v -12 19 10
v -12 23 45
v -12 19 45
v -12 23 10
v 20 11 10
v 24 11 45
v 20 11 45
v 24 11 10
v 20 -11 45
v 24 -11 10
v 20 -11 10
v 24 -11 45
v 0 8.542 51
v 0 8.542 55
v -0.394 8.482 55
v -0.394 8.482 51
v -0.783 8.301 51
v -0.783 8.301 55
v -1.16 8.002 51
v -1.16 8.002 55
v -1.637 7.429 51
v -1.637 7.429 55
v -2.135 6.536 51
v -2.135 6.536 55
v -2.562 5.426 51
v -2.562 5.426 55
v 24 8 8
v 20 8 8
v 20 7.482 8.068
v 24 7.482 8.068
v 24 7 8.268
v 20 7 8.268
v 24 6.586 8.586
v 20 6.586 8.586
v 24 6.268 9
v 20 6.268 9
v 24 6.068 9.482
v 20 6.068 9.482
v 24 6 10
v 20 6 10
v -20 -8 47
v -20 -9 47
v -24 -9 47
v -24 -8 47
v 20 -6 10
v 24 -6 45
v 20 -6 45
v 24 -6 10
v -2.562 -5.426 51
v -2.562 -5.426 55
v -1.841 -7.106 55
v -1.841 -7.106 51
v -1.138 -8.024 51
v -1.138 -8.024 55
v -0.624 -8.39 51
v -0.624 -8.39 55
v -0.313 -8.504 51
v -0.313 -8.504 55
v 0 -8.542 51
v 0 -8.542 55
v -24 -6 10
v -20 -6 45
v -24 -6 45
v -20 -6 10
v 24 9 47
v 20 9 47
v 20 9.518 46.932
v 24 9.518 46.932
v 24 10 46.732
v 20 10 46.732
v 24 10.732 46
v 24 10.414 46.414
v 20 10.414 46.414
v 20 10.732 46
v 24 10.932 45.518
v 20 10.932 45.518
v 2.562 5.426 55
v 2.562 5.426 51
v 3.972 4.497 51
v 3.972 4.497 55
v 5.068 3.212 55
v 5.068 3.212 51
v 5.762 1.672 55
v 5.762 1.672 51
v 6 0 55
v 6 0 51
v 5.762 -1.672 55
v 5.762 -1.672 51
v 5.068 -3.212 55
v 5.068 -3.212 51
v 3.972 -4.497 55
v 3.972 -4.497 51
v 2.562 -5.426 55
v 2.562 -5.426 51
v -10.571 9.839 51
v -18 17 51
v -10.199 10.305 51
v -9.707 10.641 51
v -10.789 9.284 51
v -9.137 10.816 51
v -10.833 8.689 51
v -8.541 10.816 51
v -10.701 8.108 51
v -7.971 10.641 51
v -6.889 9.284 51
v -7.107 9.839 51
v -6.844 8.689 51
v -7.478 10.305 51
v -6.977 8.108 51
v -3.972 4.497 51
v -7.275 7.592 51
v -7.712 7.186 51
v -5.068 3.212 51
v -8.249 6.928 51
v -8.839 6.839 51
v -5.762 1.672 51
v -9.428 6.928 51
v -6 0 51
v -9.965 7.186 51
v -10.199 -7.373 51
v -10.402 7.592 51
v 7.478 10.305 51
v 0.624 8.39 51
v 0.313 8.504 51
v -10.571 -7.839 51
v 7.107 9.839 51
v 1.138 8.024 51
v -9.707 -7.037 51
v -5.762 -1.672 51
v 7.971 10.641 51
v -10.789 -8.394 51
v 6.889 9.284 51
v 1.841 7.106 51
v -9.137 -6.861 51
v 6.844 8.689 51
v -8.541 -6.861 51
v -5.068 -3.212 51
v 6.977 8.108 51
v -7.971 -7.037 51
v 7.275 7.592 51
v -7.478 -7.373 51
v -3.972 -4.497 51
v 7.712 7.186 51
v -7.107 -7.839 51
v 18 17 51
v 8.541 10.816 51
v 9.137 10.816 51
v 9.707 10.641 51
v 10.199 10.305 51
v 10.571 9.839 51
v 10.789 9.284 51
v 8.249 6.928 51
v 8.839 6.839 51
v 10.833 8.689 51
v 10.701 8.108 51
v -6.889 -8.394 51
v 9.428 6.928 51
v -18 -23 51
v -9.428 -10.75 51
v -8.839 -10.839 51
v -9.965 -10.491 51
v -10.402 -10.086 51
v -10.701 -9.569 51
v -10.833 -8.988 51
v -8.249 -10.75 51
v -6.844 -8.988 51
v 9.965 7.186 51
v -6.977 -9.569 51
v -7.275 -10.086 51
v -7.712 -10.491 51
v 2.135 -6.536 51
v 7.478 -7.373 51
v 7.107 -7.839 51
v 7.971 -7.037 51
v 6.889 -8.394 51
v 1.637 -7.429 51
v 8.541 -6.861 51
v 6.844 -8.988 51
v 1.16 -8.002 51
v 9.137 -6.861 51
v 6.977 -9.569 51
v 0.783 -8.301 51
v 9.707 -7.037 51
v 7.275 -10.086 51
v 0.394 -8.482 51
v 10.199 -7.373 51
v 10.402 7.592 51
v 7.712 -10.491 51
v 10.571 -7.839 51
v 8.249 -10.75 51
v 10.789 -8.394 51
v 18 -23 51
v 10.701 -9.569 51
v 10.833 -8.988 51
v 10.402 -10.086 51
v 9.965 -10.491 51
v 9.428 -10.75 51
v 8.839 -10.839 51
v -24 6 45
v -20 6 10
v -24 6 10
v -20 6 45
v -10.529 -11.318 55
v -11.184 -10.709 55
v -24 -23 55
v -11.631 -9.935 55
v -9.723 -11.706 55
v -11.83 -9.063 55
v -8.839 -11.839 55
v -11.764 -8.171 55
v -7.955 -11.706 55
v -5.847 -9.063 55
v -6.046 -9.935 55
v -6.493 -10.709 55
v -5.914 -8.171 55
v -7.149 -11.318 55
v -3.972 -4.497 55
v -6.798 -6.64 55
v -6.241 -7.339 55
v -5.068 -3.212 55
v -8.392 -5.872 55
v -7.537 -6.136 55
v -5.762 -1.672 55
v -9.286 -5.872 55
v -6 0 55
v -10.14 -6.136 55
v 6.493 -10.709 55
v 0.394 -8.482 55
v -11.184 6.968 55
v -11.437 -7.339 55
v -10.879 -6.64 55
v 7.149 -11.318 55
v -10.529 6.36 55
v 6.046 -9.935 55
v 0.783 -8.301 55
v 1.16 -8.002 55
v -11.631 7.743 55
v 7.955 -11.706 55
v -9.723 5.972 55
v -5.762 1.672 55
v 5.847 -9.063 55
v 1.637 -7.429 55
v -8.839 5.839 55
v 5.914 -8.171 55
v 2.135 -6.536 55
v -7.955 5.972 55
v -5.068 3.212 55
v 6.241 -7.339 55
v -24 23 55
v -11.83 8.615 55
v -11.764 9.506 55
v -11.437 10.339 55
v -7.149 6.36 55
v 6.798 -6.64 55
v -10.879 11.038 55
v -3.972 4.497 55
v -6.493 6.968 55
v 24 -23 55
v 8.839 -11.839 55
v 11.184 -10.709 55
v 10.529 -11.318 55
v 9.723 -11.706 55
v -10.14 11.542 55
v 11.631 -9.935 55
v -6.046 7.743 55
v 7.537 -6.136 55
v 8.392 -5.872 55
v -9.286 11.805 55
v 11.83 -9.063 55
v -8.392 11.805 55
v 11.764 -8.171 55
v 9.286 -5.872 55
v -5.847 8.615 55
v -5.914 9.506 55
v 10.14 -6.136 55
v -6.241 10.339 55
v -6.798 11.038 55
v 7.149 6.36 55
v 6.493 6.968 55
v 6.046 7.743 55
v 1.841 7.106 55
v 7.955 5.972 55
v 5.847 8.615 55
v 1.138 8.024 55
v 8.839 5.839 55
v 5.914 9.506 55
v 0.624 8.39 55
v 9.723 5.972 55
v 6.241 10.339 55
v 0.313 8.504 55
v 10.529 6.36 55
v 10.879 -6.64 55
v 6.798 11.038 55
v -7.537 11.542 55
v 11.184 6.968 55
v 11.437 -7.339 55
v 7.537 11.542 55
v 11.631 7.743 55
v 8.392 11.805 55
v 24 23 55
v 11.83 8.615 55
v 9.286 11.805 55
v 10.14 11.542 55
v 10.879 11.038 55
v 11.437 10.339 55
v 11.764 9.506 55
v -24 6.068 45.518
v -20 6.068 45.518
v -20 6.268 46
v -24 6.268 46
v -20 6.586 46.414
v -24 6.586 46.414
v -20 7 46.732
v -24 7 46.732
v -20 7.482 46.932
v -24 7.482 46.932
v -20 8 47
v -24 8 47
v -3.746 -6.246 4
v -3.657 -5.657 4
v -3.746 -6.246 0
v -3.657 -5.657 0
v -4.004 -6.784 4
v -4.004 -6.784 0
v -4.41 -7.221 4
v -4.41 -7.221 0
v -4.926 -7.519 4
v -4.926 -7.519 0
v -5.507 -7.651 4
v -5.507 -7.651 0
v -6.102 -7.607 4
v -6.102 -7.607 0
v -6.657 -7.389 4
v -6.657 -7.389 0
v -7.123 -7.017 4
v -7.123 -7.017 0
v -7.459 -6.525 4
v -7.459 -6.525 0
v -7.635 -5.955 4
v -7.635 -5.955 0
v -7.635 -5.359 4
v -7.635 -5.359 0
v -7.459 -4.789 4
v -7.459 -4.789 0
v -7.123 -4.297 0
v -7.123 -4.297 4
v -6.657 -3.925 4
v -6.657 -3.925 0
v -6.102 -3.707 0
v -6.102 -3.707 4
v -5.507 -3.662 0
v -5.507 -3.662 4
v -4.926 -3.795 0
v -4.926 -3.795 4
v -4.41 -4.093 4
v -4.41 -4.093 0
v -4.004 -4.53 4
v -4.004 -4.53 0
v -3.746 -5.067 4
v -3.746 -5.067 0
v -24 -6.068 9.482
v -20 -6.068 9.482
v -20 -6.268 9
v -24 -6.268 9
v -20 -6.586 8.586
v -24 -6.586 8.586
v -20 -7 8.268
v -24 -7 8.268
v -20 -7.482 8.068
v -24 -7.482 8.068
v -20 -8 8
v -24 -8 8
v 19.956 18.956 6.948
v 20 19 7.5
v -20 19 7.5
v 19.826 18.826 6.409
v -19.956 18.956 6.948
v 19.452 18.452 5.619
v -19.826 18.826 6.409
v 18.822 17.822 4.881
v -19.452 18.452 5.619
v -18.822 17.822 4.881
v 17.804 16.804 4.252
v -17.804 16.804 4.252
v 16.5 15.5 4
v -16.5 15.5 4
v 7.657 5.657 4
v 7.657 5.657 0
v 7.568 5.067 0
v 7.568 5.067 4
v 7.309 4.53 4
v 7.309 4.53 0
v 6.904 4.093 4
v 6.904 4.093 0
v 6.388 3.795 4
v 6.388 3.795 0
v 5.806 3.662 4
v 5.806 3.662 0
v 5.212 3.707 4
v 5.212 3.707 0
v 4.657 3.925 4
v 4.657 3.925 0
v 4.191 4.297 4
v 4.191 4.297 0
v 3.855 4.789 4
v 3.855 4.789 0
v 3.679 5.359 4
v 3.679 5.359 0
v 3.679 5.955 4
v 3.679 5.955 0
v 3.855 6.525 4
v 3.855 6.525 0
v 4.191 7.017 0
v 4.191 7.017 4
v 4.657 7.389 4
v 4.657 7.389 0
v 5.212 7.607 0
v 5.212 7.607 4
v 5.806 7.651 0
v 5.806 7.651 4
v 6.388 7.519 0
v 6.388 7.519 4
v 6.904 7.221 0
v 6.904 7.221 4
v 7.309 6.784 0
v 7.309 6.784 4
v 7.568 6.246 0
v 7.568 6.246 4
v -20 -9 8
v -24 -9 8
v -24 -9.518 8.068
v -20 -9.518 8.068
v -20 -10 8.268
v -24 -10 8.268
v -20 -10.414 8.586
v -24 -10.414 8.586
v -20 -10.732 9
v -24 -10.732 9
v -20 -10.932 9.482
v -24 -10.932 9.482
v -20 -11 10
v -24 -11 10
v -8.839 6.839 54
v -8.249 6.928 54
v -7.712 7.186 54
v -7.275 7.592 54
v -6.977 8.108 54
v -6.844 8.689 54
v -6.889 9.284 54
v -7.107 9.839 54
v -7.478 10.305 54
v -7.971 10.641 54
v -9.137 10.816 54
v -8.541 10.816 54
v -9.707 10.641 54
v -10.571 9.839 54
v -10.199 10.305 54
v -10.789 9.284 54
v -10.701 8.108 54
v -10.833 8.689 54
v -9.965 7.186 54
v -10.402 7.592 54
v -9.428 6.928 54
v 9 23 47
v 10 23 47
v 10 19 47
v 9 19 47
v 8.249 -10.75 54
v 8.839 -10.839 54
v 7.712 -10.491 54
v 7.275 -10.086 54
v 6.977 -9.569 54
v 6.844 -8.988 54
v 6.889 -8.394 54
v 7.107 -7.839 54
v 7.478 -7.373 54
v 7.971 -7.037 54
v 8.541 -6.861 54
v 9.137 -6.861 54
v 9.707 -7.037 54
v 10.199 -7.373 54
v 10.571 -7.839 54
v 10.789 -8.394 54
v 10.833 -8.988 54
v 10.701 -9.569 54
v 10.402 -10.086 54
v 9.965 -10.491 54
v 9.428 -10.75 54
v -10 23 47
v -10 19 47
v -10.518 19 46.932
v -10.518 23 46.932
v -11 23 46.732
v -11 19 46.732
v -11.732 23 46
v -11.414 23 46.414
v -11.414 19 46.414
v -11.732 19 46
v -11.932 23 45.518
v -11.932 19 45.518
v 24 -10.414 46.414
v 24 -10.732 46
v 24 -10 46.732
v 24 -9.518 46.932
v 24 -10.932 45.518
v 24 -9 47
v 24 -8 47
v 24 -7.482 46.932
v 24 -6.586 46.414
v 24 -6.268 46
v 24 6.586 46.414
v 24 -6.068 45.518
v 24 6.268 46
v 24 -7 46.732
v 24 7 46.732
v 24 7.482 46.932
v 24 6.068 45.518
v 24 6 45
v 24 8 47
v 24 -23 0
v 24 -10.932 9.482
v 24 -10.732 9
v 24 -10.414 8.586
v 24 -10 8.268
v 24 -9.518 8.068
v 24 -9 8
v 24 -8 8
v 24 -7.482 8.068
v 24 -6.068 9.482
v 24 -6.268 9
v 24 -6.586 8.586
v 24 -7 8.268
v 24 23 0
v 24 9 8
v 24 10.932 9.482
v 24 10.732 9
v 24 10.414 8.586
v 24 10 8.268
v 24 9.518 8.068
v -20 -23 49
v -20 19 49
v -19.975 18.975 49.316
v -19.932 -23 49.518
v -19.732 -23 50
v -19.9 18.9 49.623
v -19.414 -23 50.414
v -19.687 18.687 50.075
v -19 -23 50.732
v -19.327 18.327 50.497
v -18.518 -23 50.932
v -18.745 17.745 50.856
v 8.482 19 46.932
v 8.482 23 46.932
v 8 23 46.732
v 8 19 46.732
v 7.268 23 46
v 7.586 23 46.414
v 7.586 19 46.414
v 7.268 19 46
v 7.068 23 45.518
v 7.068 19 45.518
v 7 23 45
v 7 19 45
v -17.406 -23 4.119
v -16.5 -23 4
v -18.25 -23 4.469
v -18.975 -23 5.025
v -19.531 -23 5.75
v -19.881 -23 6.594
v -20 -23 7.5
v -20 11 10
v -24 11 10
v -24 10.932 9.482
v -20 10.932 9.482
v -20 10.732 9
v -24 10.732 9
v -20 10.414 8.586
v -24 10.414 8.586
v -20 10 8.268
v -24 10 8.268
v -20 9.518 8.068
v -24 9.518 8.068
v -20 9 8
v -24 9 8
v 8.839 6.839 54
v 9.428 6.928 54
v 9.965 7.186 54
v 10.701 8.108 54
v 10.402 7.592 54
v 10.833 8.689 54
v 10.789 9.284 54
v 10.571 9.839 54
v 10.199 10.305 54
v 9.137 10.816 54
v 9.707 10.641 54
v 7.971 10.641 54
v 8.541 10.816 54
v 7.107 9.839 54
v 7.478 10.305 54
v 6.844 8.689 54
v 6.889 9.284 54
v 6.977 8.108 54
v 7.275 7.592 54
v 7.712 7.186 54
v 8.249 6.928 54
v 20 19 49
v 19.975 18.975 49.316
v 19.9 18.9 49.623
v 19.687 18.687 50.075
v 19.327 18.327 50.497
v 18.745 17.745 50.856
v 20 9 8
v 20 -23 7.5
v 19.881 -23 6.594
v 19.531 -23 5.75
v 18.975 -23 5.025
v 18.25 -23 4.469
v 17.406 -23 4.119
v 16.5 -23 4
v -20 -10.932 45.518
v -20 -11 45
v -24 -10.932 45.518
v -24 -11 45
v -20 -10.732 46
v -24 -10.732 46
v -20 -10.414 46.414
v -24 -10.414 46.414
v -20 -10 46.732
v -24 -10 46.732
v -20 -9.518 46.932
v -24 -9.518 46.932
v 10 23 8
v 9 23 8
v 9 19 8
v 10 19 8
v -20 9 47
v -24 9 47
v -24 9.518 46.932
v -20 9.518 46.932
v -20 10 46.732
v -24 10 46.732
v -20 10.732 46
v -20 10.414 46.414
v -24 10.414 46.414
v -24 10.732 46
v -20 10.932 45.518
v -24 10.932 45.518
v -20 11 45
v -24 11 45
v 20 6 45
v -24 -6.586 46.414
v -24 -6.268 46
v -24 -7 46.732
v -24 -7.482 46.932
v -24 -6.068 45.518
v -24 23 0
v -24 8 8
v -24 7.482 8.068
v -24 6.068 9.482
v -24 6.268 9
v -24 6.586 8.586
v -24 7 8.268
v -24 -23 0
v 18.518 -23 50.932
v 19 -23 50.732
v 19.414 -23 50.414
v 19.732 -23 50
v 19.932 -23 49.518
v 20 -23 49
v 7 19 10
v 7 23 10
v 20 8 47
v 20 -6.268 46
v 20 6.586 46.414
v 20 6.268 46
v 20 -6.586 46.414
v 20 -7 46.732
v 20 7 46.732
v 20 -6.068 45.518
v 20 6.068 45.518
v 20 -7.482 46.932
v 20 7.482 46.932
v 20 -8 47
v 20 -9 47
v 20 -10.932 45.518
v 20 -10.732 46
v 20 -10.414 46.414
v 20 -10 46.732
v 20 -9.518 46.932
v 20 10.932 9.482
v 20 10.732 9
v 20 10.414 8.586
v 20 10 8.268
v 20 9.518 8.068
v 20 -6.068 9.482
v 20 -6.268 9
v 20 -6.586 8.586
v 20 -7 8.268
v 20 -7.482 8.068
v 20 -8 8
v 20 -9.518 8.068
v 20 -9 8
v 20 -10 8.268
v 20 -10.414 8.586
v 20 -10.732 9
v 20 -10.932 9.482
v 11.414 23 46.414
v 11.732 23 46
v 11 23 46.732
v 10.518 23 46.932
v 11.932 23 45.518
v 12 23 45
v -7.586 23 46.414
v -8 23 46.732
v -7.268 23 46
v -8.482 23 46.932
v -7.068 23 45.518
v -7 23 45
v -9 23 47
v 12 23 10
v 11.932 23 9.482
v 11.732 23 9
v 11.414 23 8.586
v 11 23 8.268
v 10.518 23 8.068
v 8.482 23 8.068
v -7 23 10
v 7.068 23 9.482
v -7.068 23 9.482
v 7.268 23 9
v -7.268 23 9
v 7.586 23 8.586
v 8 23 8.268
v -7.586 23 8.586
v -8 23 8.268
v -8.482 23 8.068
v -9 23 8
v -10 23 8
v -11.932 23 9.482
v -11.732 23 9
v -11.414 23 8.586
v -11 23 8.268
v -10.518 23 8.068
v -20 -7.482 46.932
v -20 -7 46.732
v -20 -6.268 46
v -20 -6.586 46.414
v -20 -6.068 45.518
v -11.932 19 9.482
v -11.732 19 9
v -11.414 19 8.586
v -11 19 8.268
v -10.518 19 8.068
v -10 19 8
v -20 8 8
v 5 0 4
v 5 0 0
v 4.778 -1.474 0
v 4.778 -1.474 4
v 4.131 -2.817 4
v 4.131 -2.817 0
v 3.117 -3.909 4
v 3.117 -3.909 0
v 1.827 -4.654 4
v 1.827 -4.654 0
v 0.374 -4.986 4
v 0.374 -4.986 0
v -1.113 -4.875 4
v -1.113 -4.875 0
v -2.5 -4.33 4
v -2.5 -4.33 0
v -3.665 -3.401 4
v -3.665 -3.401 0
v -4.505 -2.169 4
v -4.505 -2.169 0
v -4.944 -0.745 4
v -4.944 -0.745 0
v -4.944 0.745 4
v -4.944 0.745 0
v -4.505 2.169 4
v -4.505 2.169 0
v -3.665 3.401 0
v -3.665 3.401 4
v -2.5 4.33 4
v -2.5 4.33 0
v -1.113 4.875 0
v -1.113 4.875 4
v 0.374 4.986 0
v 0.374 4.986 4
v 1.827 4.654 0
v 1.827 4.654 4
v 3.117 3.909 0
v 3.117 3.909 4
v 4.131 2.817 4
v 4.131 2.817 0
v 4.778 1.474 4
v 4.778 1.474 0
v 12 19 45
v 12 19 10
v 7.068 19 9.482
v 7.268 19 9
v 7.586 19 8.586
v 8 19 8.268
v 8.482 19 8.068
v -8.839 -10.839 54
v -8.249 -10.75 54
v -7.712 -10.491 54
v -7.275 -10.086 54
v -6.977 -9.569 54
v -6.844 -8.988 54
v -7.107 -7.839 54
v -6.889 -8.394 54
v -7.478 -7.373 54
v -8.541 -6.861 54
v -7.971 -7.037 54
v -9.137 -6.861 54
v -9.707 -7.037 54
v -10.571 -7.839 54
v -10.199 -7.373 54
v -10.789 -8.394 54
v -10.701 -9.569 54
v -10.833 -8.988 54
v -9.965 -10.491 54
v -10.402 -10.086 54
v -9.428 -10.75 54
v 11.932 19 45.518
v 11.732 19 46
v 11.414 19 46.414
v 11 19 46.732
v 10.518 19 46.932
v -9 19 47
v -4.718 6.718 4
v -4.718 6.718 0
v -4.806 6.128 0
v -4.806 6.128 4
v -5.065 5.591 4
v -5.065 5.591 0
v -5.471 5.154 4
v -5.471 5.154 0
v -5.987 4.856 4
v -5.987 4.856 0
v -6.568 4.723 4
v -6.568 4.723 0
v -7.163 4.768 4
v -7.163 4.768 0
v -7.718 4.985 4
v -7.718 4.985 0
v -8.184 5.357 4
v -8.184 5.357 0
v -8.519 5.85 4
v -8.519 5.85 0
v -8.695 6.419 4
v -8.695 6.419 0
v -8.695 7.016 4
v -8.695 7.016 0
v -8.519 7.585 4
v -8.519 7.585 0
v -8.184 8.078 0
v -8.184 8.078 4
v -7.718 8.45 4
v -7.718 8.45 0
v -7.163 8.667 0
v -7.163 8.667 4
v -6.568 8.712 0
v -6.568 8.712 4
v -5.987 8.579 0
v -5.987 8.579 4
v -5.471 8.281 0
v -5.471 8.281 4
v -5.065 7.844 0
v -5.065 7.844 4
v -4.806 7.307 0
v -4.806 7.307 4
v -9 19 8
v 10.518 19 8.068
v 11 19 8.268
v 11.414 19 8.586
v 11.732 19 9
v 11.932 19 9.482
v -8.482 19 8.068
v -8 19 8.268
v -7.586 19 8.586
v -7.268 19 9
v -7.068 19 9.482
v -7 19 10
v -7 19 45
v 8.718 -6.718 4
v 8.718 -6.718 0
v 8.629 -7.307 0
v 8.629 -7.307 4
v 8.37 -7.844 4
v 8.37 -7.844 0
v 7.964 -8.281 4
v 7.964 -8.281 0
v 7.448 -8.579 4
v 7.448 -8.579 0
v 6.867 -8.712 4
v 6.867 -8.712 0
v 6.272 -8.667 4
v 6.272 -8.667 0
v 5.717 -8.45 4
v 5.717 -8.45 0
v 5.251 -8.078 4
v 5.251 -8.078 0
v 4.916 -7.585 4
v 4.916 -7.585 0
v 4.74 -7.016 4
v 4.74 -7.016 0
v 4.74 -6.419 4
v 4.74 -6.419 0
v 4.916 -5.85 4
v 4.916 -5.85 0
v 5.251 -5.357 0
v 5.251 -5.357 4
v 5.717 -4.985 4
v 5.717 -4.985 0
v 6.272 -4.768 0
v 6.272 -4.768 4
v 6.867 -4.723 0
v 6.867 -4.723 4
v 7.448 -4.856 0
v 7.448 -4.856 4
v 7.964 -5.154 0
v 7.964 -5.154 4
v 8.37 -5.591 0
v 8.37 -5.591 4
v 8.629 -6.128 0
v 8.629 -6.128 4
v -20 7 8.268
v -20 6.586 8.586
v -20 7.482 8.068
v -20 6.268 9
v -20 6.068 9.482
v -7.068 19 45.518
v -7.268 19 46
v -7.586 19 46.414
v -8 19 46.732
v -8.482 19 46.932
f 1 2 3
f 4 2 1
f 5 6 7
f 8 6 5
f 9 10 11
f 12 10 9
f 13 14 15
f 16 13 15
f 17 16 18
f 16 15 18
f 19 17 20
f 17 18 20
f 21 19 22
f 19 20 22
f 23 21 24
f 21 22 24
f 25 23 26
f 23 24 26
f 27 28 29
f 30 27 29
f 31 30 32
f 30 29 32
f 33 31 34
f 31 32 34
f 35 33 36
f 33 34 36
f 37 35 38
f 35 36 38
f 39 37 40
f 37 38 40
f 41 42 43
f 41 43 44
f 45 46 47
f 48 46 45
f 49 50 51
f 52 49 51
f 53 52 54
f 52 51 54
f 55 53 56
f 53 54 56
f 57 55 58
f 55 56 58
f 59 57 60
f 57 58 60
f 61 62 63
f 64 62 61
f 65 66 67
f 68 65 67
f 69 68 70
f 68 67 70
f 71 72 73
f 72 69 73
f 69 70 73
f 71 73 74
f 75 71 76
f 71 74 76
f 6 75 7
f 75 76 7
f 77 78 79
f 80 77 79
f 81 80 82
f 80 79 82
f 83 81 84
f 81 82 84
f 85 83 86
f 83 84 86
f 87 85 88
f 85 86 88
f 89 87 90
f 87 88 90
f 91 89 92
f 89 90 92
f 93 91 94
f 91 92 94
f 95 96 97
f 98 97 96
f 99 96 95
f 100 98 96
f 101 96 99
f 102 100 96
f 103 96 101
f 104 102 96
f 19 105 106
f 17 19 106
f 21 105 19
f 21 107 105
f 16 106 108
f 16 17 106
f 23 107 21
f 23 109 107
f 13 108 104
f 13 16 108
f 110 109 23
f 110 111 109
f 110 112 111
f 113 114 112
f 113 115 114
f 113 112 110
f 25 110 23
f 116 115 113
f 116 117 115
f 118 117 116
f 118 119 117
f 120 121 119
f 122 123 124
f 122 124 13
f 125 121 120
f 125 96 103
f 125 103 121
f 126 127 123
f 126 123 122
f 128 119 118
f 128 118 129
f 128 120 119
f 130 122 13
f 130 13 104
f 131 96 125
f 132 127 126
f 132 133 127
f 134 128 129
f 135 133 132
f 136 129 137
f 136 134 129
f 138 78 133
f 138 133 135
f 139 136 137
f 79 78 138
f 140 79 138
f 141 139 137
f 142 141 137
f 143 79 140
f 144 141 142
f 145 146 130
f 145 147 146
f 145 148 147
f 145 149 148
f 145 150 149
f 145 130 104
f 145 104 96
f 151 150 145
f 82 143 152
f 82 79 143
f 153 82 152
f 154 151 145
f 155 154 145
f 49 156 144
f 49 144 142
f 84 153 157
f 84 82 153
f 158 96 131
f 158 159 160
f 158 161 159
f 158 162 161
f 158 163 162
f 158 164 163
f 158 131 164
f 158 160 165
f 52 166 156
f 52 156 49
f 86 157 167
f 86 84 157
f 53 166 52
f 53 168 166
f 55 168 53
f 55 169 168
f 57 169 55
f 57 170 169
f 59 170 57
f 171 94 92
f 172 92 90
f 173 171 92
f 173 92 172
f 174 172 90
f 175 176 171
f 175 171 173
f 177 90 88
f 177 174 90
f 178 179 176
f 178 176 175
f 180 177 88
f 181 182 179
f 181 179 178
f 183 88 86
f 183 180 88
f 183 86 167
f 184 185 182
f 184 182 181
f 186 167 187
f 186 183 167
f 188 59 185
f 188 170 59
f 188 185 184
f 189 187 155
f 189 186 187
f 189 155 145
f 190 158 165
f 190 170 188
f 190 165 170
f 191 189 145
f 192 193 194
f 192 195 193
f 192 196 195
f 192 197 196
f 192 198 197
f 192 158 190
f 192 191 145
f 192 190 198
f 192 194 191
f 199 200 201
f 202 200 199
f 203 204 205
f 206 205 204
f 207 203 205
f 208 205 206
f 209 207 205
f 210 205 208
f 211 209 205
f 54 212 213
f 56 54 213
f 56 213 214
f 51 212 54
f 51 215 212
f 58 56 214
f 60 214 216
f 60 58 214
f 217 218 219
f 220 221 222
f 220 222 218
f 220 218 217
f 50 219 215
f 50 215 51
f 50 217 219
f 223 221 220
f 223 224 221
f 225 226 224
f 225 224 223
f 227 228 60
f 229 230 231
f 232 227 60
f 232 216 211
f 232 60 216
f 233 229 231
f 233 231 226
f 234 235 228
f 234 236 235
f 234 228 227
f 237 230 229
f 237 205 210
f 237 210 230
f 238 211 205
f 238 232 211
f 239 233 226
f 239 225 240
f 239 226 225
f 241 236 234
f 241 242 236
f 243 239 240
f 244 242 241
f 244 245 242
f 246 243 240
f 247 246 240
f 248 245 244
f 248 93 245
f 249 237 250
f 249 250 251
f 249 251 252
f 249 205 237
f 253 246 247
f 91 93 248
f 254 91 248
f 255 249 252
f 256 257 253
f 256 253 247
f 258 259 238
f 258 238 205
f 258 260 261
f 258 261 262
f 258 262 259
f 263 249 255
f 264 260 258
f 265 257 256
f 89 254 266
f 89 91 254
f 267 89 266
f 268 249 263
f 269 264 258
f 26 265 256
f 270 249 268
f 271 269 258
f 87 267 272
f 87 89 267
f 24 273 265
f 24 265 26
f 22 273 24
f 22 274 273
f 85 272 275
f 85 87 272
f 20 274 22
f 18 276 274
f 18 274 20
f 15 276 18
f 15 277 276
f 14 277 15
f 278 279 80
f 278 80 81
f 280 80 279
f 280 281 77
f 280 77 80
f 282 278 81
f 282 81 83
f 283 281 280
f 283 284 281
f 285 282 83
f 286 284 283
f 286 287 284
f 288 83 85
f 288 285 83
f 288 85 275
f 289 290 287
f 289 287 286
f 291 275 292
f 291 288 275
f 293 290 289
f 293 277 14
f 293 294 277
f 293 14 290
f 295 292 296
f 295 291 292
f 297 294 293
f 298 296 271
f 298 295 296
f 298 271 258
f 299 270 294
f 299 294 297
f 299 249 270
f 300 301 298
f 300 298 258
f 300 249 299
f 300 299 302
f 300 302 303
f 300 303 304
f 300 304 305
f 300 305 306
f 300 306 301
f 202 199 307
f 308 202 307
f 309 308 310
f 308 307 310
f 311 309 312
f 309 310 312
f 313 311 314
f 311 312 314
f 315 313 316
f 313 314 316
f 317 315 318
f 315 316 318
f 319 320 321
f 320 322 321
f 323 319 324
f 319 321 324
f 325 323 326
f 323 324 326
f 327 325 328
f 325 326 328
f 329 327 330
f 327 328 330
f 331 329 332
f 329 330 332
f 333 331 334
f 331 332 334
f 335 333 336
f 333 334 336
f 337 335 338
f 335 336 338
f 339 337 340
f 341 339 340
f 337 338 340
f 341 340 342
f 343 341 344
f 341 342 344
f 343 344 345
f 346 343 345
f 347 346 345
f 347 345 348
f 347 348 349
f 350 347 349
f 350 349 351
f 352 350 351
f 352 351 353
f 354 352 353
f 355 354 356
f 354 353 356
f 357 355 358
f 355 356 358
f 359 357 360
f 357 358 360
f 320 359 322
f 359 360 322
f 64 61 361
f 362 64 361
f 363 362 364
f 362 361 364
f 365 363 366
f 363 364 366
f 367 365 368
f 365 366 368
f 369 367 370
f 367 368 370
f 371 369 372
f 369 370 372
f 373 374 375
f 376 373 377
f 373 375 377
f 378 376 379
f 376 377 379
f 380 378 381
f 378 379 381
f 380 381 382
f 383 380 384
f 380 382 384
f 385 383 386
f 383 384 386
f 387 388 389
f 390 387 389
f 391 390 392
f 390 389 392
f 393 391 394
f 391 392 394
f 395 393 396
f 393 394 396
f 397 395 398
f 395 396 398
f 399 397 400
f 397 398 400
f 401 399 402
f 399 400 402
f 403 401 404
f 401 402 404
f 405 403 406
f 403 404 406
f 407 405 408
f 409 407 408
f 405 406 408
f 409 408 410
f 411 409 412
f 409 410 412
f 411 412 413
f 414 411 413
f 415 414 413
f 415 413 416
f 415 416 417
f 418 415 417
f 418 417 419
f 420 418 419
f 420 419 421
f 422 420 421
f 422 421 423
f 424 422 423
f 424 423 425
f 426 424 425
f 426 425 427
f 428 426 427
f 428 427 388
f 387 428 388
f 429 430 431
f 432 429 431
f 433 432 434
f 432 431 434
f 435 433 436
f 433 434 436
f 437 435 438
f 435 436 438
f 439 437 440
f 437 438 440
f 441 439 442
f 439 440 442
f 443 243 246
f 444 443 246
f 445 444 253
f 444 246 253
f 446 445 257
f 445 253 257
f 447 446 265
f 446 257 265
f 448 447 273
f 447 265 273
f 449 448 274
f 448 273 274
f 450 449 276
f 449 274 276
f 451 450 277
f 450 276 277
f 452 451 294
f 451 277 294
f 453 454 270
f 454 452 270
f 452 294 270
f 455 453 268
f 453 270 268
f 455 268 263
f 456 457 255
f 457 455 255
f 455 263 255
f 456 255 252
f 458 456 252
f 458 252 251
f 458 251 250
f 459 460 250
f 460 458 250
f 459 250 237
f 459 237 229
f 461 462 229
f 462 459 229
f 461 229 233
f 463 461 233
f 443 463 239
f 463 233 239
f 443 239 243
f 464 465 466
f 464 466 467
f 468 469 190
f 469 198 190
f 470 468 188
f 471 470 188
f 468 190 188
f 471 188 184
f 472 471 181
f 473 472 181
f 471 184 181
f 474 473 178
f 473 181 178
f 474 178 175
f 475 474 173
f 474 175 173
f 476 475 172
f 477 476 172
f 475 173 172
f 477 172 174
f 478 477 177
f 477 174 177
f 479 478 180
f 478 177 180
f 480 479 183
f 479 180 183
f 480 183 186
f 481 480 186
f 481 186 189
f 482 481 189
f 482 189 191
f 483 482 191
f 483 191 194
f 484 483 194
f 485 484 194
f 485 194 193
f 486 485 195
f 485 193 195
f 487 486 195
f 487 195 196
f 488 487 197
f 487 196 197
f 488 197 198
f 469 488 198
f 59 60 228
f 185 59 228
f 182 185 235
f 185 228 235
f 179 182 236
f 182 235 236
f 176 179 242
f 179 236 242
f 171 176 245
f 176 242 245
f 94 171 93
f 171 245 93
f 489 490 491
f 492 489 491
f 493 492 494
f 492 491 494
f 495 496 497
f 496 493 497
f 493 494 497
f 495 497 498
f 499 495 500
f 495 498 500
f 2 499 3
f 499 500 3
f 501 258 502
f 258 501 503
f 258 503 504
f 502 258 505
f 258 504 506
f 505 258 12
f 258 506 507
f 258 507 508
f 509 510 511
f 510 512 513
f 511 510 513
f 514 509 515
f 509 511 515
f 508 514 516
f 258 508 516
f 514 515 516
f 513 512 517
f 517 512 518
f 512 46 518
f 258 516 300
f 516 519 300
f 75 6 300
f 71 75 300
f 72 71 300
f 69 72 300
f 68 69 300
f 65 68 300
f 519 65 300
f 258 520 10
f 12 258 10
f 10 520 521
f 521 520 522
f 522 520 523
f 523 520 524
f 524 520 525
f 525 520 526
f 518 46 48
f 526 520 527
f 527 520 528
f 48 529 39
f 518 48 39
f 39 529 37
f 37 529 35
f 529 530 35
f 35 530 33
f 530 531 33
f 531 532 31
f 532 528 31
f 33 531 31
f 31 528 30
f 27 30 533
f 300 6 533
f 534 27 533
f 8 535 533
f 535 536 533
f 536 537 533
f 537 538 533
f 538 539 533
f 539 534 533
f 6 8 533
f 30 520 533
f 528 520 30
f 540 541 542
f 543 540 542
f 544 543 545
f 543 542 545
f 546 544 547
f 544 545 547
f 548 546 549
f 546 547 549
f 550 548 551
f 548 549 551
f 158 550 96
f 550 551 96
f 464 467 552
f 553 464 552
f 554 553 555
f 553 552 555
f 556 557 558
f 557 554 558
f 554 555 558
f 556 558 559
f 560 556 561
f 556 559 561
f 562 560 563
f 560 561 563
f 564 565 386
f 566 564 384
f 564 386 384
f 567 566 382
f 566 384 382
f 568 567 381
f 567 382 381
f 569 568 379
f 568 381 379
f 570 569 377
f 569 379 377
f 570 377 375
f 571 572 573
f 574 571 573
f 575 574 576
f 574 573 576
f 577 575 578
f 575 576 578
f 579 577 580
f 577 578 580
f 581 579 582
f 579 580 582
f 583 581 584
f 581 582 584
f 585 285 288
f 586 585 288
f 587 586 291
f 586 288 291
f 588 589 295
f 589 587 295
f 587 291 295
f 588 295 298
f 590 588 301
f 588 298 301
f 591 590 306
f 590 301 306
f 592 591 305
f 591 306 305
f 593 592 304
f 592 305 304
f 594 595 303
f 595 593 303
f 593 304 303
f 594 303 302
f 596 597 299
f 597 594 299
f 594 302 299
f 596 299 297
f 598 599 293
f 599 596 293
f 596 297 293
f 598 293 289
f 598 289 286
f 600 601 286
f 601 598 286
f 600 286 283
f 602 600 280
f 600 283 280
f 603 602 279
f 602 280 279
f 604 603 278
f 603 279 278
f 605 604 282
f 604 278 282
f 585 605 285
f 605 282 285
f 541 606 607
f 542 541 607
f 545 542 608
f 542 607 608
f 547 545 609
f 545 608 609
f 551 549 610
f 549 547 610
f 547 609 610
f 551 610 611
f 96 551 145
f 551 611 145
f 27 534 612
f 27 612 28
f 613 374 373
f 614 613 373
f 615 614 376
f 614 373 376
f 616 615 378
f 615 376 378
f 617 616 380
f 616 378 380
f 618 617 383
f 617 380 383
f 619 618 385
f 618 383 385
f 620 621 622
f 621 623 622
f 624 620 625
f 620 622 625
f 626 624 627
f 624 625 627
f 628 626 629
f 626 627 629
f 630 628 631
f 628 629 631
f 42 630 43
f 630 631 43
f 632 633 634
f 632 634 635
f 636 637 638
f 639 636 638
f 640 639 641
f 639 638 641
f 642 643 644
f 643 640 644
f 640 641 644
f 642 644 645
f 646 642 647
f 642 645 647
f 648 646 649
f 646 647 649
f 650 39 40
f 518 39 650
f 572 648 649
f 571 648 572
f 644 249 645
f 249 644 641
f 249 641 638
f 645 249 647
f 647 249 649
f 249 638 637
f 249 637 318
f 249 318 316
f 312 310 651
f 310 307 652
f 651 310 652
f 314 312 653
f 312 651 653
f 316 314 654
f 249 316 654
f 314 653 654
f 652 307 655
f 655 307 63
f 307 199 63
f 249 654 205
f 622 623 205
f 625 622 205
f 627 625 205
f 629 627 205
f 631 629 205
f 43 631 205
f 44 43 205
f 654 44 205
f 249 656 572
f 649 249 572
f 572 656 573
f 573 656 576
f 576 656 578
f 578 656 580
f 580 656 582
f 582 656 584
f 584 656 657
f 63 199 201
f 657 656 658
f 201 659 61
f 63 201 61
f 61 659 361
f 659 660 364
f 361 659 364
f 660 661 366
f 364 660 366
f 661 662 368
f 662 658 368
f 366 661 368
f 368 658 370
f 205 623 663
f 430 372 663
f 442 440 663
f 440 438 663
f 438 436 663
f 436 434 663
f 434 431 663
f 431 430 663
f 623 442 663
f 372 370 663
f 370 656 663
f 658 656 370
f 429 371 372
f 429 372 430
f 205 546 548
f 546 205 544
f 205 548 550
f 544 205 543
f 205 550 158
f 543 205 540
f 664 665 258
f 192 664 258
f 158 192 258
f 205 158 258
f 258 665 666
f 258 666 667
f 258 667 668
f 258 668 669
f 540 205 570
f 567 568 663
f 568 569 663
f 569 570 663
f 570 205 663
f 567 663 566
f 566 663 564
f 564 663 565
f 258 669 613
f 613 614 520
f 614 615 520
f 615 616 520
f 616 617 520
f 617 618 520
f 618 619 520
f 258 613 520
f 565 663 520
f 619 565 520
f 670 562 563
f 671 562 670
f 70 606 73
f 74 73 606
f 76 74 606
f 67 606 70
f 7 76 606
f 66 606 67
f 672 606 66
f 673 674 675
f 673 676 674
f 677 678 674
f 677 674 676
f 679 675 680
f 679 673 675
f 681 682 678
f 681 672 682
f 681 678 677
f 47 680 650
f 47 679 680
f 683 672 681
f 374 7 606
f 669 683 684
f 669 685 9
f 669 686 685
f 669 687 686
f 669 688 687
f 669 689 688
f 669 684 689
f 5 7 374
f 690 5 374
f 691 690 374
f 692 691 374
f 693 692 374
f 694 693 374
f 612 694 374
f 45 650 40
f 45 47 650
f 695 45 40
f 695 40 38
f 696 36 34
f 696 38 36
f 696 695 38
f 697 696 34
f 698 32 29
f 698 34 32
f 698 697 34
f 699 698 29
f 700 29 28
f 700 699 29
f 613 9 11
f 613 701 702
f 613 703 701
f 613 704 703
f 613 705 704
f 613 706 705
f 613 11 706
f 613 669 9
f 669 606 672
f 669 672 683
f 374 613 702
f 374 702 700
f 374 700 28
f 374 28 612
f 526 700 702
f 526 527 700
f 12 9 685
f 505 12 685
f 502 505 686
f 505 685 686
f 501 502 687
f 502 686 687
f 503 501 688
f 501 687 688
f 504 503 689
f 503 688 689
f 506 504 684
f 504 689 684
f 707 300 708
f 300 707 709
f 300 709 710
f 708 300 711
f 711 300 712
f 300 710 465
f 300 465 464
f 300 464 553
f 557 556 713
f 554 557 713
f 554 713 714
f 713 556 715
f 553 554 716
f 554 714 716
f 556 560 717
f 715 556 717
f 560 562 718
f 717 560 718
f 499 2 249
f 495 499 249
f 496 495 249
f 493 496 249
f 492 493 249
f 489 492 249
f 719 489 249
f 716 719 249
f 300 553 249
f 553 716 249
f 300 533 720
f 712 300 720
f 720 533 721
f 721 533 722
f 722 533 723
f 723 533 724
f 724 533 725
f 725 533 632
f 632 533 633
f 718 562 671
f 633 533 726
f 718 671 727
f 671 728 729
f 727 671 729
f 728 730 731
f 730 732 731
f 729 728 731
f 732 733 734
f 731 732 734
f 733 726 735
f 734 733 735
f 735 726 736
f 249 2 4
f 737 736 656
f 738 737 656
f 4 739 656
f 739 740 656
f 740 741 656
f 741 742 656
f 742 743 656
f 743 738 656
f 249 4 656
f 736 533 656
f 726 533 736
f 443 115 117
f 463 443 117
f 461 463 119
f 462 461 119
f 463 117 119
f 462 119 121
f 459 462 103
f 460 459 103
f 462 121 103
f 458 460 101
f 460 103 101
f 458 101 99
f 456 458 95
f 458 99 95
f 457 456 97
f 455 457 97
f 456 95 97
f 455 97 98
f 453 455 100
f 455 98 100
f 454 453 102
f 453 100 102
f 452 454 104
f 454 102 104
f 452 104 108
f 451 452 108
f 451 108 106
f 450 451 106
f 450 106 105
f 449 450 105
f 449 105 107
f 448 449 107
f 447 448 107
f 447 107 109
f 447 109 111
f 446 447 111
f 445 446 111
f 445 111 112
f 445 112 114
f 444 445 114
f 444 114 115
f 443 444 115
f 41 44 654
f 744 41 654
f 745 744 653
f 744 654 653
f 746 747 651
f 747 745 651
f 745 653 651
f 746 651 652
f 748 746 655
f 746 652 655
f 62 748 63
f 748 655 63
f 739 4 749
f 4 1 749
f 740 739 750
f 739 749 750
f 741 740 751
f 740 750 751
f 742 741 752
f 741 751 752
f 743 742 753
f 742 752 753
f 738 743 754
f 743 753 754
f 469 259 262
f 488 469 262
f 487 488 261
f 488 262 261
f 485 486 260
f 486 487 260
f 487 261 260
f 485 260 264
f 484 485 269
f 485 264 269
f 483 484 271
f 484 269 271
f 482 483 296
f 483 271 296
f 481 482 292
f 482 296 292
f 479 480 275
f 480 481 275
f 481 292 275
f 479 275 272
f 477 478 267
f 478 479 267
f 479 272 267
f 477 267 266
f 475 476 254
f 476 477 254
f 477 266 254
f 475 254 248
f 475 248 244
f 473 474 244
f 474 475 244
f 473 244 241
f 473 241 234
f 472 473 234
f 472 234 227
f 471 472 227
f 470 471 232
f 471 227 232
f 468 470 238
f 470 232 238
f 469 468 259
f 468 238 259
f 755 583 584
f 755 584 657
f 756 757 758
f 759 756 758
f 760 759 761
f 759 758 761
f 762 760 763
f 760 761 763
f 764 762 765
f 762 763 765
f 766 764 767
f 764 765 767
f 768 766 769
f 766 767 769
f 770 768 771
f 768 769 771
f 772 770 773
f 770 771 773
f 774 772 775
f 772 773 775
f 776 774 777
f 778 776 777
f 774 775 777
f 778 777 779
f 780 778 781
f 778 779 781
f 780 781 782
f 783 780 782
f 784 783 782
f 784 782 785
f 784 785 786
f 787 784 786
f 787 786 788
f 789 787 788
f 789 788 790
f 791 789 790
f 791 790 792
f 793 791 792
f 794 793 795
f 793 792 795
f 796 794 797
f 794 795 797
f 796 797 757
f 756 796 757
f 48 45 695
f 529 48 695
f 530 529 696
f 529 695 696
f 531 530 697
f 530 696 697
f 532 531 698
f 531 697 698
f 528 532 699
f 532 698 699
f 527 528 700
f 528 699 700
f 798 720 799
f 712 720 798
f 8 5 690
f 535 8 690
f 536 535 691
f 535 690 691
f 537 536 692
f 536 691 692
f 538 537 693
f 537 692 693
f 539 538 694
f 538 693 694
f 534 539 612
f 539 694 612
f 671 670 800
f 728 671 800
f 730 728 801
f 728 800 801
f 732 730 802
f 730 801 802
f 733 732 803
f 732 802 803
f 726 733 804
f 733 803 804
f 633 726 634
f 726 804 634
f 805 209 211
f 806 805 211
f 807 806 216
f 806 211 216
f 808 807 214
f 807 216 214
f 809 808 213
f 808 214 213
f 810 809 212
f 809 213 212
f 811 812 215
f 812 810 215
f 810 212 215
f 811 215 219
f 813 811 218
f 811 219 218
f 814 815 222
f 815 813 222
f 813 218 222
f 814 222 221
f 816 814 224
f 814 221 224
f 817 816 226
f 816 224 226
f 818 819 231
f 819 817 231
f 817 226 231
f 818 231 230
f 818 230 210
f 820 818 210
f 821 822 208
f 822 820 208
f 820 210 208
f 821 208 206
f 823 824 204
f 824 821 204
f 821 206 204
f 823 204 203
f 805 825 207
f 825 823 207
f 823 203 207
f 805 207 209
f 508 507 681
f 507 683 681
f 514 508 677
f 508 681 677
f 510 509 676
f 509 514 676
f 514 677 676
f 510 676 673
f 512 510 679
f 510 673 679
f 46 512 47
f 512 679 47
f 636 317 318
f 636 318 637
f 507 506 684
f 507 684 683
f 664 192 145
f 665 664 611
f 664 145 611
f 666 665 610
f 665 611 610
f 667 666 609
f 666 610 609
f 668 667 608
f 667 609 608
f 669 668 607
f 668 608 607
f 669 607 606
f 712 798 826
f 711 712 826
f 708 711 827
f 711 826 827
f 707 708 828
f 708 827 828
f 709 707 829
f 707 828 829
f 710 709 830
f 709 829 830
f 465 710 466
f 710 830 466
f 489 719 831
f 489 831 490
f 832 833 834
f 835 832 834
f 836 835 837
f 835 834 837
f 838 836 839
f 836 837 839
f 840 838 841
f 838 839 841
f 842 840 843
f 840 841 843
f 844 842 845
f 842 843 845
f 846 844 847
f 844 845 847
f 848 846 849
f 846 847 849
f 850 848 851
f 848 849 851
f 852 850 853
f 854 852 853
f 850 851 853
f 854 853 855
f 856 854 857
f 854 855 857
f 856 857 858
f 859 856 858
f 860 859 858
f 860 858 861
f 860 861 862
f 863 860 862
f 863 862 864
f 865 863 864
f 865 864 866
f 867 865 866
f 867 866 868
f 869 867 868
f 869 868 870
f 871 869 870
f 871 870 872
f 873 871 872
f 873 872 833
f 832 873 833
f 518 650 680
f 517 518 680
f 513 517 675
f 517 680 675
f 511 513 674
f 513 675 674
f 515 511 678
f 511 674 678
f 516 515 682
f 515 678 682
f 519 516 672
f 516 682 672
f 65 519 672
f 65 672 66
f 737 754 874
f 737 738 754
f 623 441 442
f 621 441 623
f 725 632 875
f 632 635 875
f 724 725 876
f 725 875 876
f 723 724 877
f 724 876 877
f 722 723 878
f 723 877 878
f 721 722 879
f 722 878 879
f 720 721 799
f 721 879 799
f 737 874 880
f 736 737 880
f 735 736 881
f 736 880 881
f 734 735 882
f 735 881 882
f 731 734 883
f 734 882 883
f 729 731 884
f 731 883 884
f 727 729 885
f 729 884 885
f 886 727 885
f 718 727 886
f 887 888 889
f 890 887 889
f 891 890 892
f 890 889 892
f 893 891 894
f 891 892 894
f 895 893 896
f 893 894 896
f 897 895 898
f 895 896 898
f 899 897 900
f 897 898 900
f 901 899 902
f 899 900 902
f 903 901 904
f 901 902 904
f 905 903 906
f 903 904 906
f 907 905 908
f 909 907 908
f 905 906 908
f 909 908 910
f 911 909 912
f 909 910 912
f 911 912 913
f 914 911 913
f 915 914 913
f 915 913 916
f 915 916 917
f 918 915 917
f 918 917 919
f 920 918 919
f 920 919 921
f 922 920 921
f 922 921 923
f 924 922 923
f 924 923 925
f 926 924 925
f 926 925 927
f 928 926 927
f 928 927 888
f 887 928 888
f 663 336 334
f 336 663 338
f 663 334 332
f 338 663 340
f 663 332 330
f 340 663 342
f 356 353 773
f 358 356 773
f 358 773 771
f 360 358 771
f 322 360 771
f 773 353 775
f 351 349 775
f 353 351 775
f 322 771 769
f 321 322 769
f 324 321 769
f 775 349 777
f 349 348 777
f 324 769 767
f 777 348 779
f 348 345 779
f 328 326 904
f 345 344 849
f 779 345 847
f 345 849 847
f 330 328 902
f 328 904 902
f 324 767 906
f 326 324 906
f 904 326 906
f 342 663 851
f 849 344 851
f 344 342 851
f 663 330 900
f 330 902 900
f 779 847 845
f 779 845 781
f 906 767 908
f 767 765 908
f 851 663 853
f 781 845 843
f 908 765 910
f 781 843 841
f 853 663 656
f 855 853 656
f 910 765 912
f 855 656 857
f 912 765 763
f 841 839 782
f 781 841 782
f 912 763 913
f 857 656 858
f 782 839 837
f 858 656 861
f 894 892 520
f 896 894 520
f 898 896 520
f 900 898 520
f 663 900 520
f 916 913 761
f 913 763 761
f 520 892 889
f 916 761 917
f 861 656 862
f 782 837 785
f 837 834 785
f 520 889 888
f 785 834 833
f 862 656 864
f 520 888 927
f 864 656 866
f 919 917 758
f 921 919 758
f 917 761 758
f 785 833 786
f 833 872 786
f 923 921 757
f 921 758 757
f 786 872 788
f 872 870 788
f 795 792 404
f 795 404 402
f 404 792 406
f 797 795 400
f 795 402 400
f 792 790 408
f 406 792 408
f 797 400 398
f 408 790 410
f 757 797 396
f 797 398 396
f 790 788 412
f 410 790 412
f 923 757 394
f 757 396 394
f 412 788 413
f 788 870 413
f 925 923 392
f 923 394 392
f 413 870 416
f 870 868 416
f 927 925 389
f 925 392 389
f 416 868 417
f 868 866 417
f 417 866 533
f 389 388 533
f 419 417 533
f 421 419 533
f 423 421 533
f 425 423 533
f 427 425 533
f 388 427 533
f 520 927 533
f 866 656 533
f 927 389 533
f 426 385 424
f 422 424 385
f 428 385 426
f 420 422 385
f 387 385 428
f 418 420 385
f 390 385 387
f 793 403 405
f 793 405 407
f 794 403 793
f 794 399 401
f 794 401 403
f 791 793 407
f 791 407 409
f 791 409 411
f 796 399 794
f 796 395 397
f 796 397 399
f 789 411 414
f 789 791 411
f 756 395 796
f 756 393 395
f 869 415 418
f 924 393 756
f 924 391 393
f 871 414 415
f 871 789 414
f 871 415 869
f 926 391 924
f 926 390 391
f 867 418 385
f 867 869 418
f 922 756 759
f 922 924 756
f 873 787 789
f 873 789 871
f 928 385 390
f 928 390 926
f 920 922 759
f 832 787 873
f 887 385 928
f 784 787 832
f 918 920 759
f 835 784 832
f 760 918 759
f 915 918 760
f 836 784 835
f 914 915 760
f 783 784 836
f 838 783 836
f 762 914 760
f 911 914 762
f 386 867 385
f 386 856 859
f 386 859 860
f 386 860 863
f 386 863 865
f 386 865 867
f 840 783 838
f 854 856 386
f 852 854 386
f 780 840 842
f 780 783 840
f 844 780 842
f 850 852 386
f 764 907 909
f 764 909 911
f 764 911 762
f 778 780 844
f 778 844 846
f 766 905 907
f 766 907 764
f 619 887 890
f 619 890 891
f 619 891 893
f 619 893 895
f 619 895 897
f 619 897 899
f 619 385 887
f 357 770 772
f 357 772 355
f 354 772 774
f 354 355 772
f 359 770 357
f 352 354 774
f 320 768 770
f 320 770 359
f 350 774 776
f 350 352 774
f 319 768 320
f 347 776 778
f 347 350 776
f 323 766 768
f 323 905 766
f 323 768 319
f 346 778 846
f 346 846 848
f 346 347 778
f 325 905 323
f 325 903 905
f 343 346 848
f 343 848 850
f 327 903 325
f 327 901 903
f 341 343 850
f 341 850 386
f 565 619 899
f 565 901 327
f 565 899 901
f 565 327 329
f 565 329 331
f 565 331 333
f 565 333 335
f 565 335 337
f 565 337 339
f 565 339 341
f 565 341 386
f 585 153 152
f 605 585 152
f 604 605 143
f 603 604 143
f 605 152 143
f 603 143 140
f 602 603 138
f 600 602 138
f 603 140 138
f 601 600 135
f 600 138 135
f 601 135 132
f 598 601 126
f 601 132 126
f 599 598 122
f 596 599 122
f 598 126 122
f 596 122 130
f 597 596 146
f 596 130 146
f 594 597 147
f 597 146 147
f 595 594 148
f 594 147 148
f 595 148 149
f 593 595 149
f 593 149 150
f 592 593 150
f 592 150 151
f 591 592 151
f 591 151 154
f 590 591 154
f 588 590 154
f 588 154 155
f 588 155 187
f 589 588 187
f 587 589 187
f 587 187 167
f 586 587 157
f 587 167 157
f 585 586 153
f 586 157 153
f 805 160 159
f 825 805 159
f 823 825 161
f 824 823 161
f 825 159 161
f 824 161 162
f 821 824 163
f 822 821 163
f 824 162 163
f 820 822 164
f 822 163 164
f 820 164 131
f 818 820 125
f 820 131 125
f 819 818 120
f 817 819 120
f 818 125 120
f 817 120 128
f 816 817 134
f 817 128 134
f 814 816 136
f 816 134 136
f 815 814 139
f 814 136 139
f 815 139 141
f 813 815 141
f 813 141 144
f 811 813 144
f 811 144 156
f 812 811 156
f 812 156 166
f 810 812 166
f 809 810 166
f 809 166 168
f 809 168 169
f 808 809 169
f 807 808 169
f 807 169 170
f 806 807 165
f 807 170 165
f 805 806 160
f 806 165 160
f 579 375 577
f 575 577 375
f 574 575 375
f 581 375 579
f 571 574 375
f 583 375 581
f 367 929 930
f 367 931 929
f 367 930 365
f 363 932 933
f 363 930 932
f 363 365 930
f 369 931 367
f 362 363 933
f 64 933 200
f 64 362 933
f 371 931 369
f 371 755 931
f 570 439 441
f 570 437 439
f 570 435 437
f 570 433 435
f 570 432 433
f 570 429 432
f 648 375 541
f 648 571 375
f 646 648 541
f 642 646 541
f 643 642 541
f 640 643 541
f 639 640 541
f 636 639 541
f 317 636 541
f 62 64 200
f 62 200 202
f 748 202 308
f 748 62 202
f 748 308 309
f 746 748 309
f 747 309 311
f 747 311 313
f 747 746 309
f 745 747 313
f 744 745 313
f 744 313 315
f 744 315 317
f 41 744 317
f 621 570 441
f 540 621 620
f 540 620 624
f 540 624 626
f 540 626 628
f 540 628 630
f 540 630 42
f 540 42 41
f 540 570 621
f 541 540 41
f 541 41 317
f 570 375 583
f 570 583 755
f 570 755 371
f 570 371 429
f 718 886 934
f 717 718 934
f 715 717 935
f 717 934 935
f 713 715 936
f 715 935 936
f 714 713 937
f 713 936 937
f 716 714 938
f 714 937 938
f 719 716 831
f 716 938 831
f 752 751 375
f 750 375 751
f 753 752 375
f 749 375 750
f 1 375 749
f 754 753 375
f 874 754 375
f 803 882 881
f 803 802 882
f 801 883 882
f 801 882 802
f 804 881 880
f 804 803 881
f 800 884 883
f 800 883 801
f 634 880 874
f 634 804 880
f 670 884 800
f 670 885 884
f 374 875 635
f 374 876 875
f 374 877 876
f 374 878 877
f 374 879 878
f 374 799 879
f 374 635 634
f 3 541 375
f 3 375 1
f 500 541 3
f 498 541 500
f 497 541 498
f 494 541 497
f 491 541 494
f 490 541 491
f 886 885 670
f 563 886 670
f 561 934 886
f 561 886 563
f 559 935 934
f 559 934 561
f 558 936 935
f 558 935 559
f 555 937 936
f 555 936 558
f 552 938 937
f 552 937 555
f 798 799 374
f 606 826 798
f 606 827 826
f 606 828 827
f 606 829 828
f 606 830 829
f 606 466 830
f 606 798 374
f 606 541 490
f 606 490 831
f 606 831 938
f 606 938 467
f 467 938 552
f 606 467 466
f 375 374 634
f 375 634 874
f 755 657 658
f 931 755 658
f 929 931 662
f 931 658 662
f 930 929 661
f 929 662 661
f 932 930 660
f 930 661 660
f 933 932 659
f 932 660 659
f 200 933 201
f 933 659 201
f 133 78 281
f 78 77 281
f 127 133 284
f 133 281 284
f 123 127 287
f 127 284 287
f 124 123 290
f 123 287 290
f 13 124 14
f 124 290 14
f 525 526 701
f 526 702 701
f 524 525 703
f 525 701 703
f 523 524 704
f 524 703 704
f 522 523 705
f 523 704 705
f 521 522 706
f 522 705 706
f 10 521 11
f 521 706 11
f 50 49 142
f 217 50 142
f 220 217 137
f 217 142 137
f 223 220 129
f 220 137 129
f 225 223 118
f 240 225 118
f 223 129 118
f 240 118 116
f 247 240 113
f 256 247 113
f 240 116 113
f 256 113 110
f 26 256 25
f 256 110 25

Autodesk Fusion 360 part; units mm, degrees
sketch "Sketch1" plane through (0, 0, 0) normal (0, 0, 1) x (1, 0, 0)
  line L0 (-24, -23) -> (24, -23)
  line L1 (24, -23) -> (24, 23)
  line L2 (24, 23) -> (-24, 23)
  line L3 (-24, 23) -> (-24, -23)
  dimension "d1" = 48
  dimension "d2" = 46
  dimension "d3" = 24
  dimension "d4" = 23
extrude "Extrude1" add sketch "Sketch1" along normal blind 55
sketch "Sketch2" plane through (0, -23, 0) normal (0, -1, 0) x (1, 0, 0)
  line L0 (-24, 0) -> (24, 0)
  line L1 (24, 0) -> (24, 55)
  line L2 (24, 55) -> (-24, 55)
  line L3 (-24, 55) -> (-24, 0)
  line L4 (-20, 51) -> (20, 51)
  line L5 (20, 51) -> (20, 4)
  line L6 (20, 4) -> (-20, 4)
  line L7 (-20, 4) -> (-20, 51)
  dimension "d7" = 40
  dimension "d8" = 20
  dimension "d10" = 4
  dimension "d58" = 4
extrude "Extrude2" cut sketch "Sketch2" against normal blind 42 contours L4 L5 L6 L7
sketch "Sketch4" plane through (0, 0, 55) normal (0, 0, 1) x (-1, 0, 0)
  line L0 (24, -23) -> (24, 23)
  line L1 (24, 23) -> (-24, 23)
  line L2 (-24, 23) -> (-24, -23)
  line L3 (-24, -23) -> (24, -23)
  circle A0 centre (0, 0) radius 6
  dimension "d23" = 12
hole "Hole1" at (0, 0, 55) direction (0, 0, -1) diameter 12 depth 4 tip angle 118
sketch "Sketch5" plane through (0, 0, 55) normal (0, 0, 1) x (-1, 0, 0)
  circle A0 centre (0, 0) radius 6
  line L0 (24, -23) -> (24, 23)
  line L1 (24, 23) -> (-24, 23)
  line L2 (-24, 23) -> (-24, -23)
  line L3 (-24, -23) -> (24, -23)
  circle A1 centre (-8.8388, -8.8388) radius 1.5
  point P0 (8.8388, -8.8388)
  point P1 (8.8388, 8.8388)
  point P2 (-8.8388, 8.8388)
  dimension "d27" = 12.5
  dimension "d28" = 3
  dimension "d30" = 360
hole "Hole2" at (8.8388, 8.8388, 55) at (-8.8388, 8.8388, 55) at (-8.8388, -8.8388, 55) at (8.8388, -8.8388, 55) direction (0, 0, -1) diameter 4 depth 4 tip angle 118 countersink diameter 6 countersink angle 90
sketch "Sketch7" plane through (0, 0, 0) normal (0, 0, -1) x (1, 0, 0)
  line L0 (-24, 23) -> (-24, -23)
  line L1 (-24, -23) -> (24, -23)
  line L2 (24, -23) -> (24, 23)
  line L3 (24, 23) -> (-24, 23)
  circle A0 centre (0, 0) radius 5
  circle A1 centre (5.6569, -5.6569) radius 2
  circle A2 centre (6.7175, 6.7175) radius 2
  circle A3 centre (-6.7175, -6.7175) radius 2
  circle A4 centre (-5.6569, 5.6569) radius 2
  dimension "d45" = 10
  dimension "d67" = 4
  dimension "d68" = 4
  dimension "d69" = 9.5
  dimension "d70" = 8
  dimension "d71" = 17.3431
  dimension "d72" = 16.2825
  dimension "d74" = 360
extrude "Extrude4" cut sketch "Sketch7" against normal blind 4 contours A0 | A1 | A2 | A3 | A4
sketch "Sketch8" plane through (0, 0, 55) normal (0, 0, 1) x (-1, 0, 0)
  circle A0 centre (0, 0) radius 6
  line L0 (24, -23) -> (24, 23)
  line L1 (24, 23) -> (-24, 23)
  line L2 (-24, 23) -> (-24, -23)
  line L3 (-24, -23) -> (24, -23)
  ellipse E0 centre (0, 0) end of major axis (0, 8.5421) minor radius 3.3168
  line L4 (0, -8.5421) -> (0, 8.5421)
  line L5 (3.3168, 0) -> (-3.3168, 0)
  circle A1 centre (8.8388, 8.8388) radius 3
  circle A2 centre (-8.8388, -8.8388) radius 3
  circle A3 centre (8.8388, -8.8388) radius 3
  circle A4 centre (-8.8388, 8.8388) radius 3
extrude "Extrude5" cut sketch "Sketch8" against normal blind 4 contours A0 E0 L4 | A0 E0 L4 | A0 E0 L4 | A0 E0 L4
sketch "Sketch3" plane through (24, 0, 0) normal (1, 0, 0) x (0, 1, 0)
  line L0 (-21, 0) -> (23, 0)
  line L1 (23, 0) -> (23, 50)
  line L2 (23, 50) -> (-21, 50)
  line L3 (-11, 47) -> (-6, 47)
  line L4 (-6, 47) -> (-6, 8)
  line L5 (-6, 8) -> (-11, 8)
  line L6 (-11, 8) -> (-11, 47)
  line L7 (6, 47) -> (11, 47)
  line L8 (11, 47) -> (11, 8)
  line L9 (11, 8) -> (6, 8)
  line L10 (6, 8) -> (6, 47)
  line L11 (-23, 0) -> (23, 0)
  line L12 (23, 0) -> (23, 55)
  line L13 (23, 55) -> (-23, 55)
  line L14 (-23, 55) -> (-23, 0)
  line L15 (-23, 51) -> (-23, 4)
  point P0 (-23, 55)
  point P1 (23, 55)
  dimension "d16" = 8
  dimension "d20" = 12
  dimension "d60" = 8
  dimension "d75" = 5
  dimension "d76" = 5
  dimension "d97" = 12
  dimension "d100" = 8
  dimension "d101" = 8
extrude "Extrude6" cut sketch "Sketch3" against normal blind 48 contours L3 L4 L5 L6 | L7 L8 L9 L10
sketch "Sketch9" plane through (0, 23, 0) normal (0, 1, 0) x (-1, 0, 0)
  line L0 (-24, 0) -> (24, 0)
  line L1 (24, 0) -> (24, 55)
  line L2 (24, 55) -> (-24, 55)
  line L3 (-24, 55) -> (-24, 0)
  line L4 (-12, 47) -> (-7, 47)
  line L5 (-7, 47) -> (-7, 8)
  line L6 (-7, 8) -> (-12, 8)
  line L7 (-12, 8) -> (-12, 47)
  line L8 (7, 47) -> (12, 47)
  line L9 (12, 47) -> (12, 8)
  line L10 (12, 8) -> (7, 8)
  line L11 (7, 8) -> (7, 47)
  line L12 (-24, 0) -> (24, 0)
  dimension "d79" = 8
  dimension "d80" = 8
  dimension "d81" = 8
  dimension "d82" = 8
  dimension "d83" = 12
  dimension "d84" = 12
  dimension "d85" = 5
  dimension "d86" = 5
extrude "Extrude7" cut sketch "Sketch9" against normal blind 44 contours L4 L5 L6 L7 | L8 L9 L10 L11
fillet "Fillet2" radius 3.5 3 edges at (0, 19, 4) (-20, -2, 4) (20, -2, 4)
fillet "Fillet3" radius 2 24 edges at (22, 11, 8) (22, -6, 8) (-22, 11, 8) (-22, -6, 8) (22, 6, 8) (22, -11, 8) (22, -11, 47) (22, 6, 47) (22, 11, 47) (22, -6, 47) (-22, -6, 47) (-22, -11, 47) (-22, 6, 47) (-22, 11, 47) (-22, -11, 8) (-22, 6, 8) (-7, 21, 8) (12, 21, 8) (7, 21, 8) (-12, 21, 8) (12, 21, 47) (-7, 21, 47) (7, 21, 47) (-12, 21, 47)
fillet "Fillet4" radius 2 3 edges at (-20, -2, 51) (0, 19, 51) (20, -2, 51)
